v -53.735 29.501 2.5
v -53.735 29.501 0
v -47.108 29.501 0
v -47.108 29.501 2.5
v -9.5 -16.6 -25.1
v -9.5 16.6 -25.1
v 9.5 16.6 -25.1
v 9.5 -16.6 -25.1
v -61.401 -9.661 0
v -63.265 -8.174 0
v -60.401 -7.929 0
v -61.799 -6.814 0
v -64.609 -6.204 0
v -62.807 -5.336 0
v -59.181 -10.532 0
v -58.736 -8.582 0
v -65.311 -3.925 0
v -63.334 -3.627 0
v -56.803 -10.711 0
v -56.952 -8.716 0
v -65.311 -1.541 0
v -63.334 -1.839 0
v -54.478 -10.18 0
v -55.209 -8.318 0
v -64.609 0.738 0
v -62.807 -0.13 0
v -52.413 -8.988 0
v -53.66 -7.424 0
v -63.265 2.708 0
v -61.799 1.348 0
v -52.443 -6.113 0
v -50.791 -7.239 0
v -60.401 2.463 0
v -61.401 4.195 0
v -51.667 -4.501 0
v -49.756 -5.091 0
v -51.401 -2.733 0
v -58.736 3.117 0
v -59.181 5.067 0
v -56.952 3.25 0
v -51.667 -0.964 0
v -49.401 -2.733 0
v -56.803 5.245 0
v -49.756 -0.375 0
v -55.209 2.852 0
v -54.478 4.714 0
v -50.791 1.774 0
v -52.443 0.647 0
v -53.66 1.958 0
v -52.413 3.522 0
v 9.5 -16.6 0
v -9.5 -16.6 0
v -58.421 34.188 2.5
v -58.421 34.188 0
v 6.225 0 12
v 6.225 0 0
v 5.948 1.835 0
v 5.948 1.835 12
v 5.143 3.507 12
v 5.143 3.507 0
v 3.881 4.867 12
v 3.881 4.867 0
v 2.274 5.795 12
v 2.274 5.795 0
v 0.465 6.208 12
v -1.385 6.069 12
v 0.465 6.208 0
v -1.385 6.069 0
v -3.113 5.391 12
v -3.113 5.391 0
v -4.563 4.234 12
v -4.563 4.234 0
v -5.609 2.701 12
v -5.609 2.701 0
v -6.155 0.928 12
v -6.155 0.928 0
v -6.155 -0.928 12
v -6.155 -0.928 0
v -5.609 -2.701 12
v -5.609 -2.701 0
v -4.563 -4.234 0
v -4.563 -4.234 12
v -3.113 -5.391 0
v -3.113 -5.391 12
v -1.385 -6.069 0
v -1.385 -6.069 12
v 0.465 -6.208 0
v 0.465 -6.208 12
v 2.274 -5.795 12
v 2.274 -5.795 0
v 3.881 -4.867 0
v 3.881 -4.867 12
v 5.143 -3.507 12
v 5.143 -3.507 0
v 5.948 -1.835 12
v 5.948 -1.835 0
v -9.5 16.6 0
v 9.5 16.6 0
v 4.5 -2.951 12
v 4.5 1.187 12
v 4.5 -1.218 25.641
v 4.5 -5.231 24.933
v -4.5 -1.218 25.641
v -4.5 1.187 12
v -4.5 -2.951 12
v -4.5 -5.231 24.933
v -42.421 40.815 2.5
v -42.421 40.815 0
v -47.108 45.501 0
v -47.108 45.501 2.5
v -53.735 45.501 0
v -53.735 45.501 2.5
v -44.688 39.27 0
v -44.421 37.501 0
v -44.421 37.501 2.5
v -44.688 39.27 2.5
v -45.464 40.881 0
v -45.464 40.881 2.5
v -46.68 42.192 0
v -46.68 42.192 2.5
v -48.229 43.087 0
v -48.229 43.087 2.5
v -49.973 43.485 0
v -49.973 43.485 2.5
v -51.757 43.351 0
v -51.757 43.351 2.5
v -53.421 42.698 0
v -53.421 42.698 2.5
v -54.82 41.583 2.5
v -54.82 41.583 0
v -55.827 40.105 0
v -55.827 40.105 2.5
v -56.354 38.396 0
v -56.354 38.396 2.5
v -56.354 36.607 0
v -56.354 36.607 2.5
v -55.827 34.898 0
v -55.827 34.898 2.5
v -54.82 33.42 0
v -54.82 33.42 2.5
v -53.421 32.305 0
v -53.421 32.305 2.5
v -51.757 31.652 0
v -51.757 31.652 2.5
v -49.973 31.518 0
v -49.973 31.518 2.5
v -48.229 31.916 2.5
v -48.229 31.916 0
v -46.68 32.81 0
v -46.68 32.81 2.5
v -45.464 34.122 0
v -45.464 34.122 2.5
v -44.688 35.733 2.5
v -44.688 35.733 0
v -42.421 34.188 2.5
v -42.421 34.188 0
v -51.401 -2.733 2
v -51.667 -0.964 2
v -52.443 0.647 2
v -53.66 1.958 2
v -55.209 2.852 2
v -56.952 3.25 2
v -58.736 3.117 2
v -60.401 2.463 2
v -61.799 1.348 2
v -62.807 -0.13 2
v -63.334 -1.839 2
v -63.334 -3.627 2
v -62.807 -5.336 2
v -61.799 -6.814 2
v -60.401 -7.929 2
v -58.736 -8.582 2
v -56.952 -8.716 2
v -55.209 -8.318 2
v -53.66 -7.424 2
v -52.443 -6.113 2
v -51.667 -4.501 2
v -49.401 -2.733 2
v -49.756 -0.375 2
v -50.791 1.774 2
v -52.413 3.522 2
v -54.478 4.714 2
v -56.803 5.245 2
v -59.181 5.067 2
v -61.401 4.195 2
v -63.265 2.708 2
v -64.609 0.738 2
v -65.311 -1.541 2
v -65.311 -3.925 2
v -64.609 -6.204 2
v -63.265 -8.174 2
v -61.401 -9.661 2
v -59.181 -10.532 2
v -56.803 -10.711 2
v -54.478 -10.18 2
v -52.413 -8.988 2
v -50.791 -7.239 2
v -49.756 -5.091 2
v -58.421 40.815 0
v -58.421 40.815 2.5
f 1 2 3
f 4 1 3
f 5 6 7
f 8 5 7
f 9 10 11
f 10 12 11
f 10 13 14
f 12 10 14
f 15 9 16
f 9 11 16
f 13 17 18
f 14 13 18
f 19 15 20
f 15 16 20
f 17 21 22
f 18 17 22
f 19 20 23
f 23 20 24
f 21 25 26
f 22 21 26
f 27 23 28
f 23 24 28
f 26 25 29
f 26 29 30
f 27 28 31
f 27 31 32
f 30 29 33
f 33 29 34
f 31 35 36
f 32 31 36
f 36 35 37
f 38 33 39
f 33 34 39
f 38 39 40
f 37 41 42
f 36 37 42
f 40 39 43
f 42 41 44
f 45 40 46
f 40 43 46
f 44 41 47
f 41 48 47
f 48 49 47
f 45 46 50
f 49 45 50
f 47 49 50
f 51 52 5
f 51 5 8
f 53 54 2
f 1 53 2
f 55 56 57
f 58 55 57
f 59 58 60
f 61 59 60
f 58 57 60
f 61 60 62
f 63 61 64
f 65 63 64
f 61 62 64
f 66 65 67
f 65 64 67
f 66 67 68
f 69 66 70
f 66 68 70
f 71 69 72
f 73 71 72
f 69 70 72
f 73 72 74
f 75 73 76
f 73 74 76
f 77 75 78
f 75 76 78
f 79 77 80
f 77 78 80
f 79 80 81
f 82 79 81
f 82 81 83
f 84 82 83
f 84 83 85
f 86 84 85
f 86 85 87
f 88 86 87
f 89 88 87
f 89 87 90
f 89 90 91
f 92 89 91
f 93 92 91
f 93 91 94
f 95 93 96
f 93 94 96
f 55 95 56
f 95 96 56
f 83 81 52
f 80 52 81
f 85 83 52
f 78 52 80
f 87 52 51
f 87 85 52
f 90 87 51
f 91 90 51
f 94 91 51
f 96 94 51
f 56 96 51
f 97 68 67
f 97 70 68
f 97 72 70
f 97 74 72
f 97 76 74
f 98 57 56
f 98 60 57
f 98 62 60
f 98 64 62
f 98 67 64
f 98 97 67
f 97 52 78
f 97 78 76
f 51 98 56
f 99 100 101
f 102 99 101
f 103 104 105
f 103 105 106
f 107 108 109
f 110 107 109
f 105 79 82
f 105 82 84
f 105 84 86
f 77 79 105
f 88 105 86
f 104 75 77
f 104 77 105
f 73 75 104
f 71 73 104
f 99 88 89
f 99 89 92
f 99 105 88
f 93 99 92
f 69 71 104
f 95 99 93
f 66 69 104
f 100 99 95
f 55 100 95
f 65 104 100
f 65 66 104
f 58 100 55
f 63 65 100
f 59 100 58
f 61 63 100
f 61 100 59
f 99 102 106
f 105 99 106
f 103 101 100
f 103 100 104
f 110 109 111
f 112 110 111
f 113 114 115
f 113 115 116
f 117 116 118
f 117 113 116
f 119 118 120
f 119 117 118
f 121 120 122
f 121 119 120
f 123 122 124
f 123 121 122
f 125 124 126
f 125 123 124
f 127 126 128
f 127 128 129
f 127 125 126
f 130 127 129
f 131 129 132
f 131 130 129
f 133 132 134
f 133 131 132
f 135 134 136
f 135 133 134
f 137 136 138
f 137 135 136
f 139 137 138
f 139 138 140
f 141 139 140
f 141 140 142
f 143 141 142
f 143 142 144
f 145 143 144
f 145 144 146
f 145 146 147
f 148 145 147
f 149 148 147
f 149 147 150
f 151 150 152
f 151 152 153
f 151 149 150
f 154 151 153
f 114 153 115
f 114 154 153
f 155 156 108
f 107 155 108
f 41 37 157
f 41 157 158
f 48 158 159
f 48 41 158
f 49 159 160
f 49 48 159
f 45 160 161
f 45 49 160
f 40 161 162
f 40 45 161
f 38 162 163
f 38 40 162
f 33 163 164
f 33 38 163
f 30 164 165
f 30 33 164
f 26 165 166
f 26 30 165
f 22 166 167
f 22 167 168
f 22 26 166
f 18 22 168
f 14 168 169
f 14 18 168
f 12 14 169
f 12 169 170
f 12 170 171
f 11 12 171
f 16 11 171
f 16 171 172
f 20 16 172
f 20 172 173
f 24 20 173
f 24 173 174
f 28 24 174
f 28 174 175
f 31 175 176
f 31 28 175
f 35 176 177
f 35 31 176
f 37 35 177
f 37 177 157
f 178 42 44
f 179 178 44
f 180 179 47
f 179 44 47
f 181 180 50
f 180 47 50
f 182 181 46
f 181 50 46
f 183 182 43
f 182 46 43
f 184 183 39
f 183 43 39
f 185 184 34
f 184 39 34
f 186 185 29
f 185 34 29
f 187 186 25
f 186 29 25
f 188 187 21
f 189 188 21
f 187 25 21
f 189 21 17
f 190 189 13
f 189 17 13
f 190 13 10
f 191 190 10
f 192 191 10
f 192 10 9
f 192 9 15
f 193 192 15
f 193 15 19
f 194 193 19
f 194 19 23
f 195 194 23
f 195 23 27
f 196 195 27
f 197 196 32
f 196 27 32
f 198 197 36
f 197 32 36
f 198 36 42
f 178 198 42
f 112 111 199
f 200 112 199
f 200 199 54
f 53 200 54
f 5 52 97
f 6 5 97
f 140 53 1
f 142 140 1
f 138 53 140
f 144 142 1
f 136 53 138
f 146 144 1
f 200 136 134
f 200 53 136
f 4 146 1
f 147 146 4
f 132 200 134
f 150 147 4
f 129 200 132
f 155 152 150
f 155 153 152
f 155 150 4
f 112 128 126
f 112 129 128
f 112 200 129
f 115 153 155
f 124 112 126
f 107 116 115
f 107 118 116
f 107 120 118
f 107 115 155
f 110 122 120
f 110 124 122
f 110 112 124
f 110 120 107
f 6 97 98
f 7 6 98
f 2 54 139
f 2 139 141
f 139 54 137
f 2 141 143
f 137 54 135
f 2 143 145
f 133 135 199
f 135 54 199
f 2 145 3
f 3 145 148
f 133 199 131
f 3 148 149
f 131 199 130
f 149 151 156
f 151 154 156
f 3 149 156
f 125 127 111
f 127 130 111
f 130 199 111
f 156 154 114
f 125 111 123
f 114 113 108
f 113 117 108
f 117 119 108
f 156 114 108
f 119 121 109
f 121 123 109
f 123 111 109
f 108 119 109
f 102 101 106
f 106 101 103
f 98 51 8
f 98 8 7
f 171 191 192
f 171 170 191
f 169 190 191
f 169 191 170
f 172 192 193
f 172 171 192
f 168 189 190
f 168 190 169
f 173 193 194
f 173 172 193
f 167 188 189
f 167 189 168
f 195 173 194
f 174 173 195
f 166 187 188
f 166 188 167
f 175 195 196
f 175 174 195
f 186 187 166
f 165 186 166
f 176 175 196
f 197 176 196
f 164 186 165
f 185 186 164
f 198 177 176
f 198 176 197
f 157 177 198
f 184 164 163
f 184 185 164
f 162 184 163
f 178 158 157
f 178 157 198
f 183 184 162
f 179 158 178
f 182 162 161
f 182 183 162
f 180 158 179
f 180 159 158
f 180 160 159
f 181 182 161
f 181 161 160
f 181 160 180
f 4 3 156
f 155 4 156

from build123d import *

# Parameters (mm, degrees)
F0_W      = 19
F0_H      = 33.2
F1_DEPTH  = 25.1
F2_R      = 6.225
F3_DEPTH  = 12
F7_W      = 9
F7_H      = 19.96655
F8_DEPTH  = 2.0375
F9_R      = 8
F9_R_2    = 6
F10_DEPTH = 2
F11_DEPTH = 2.5


with BuildPart() as f1:
    # F0 (on Top) → F1 (new body)
    with BuildSketch(Plane.XY):
        Rectangle(F0_W, F0_H)
    extrude(amount=-F1_DEPTH)

    # F2 (on Top) → F3 (join)
    with BuildSketch(Plane.XY):
        Circle(F2_R)
    extrude(amount=F3_DEPTH)

    # F7 (on face) → F8 (join, symmetric)
    with BuildSketch(Plane(origin=(0, 1.197071, 0.211076), x_dir=(-1, 0, 0), z_dir=(0, 0.984808, 0.173648))):
        with Locations((0, 15.479301)):
            Rectangle(F7_W, F7_H)
    extrude(amount=F8_DEPTH, both=True)


with BuildPart() as f10:
    # F9 (on Top) → F10 (new body)
    with BuildSketch(Plane.XY):
        with Locations((-57.400849, -2.73289)):
            Circle(F9_R)
        with Locations((-57.400849, -2.73289)):
            Circle(F9_R_2, mode=Mode.SUBTRACT)
    extrude(amount=F10_DEPTH)


with BuildPart() as f11:
    # F9 (on Top) → F11 (new body)
    with BuildSketch(Plane.XY):
        Polygon((-47.107671, 45.501473), (-53.735088, 45.501473), (-58.42138, 40.815181), (-58.42138, 34.187764), (-53.735088, 29.501473), (-47.107671, 29.501473), (-42.42138, 34.187764), (-42.42138, 40.815181), align=None)
        with Locations((-50.42138, 37.501473)):
            Circle(F9_R_2, mode=Mode.SUBTRACT)
    extrude(amount=F11_DEPTH)


solid = Compound([f1.part, f10.part, f11.part])
